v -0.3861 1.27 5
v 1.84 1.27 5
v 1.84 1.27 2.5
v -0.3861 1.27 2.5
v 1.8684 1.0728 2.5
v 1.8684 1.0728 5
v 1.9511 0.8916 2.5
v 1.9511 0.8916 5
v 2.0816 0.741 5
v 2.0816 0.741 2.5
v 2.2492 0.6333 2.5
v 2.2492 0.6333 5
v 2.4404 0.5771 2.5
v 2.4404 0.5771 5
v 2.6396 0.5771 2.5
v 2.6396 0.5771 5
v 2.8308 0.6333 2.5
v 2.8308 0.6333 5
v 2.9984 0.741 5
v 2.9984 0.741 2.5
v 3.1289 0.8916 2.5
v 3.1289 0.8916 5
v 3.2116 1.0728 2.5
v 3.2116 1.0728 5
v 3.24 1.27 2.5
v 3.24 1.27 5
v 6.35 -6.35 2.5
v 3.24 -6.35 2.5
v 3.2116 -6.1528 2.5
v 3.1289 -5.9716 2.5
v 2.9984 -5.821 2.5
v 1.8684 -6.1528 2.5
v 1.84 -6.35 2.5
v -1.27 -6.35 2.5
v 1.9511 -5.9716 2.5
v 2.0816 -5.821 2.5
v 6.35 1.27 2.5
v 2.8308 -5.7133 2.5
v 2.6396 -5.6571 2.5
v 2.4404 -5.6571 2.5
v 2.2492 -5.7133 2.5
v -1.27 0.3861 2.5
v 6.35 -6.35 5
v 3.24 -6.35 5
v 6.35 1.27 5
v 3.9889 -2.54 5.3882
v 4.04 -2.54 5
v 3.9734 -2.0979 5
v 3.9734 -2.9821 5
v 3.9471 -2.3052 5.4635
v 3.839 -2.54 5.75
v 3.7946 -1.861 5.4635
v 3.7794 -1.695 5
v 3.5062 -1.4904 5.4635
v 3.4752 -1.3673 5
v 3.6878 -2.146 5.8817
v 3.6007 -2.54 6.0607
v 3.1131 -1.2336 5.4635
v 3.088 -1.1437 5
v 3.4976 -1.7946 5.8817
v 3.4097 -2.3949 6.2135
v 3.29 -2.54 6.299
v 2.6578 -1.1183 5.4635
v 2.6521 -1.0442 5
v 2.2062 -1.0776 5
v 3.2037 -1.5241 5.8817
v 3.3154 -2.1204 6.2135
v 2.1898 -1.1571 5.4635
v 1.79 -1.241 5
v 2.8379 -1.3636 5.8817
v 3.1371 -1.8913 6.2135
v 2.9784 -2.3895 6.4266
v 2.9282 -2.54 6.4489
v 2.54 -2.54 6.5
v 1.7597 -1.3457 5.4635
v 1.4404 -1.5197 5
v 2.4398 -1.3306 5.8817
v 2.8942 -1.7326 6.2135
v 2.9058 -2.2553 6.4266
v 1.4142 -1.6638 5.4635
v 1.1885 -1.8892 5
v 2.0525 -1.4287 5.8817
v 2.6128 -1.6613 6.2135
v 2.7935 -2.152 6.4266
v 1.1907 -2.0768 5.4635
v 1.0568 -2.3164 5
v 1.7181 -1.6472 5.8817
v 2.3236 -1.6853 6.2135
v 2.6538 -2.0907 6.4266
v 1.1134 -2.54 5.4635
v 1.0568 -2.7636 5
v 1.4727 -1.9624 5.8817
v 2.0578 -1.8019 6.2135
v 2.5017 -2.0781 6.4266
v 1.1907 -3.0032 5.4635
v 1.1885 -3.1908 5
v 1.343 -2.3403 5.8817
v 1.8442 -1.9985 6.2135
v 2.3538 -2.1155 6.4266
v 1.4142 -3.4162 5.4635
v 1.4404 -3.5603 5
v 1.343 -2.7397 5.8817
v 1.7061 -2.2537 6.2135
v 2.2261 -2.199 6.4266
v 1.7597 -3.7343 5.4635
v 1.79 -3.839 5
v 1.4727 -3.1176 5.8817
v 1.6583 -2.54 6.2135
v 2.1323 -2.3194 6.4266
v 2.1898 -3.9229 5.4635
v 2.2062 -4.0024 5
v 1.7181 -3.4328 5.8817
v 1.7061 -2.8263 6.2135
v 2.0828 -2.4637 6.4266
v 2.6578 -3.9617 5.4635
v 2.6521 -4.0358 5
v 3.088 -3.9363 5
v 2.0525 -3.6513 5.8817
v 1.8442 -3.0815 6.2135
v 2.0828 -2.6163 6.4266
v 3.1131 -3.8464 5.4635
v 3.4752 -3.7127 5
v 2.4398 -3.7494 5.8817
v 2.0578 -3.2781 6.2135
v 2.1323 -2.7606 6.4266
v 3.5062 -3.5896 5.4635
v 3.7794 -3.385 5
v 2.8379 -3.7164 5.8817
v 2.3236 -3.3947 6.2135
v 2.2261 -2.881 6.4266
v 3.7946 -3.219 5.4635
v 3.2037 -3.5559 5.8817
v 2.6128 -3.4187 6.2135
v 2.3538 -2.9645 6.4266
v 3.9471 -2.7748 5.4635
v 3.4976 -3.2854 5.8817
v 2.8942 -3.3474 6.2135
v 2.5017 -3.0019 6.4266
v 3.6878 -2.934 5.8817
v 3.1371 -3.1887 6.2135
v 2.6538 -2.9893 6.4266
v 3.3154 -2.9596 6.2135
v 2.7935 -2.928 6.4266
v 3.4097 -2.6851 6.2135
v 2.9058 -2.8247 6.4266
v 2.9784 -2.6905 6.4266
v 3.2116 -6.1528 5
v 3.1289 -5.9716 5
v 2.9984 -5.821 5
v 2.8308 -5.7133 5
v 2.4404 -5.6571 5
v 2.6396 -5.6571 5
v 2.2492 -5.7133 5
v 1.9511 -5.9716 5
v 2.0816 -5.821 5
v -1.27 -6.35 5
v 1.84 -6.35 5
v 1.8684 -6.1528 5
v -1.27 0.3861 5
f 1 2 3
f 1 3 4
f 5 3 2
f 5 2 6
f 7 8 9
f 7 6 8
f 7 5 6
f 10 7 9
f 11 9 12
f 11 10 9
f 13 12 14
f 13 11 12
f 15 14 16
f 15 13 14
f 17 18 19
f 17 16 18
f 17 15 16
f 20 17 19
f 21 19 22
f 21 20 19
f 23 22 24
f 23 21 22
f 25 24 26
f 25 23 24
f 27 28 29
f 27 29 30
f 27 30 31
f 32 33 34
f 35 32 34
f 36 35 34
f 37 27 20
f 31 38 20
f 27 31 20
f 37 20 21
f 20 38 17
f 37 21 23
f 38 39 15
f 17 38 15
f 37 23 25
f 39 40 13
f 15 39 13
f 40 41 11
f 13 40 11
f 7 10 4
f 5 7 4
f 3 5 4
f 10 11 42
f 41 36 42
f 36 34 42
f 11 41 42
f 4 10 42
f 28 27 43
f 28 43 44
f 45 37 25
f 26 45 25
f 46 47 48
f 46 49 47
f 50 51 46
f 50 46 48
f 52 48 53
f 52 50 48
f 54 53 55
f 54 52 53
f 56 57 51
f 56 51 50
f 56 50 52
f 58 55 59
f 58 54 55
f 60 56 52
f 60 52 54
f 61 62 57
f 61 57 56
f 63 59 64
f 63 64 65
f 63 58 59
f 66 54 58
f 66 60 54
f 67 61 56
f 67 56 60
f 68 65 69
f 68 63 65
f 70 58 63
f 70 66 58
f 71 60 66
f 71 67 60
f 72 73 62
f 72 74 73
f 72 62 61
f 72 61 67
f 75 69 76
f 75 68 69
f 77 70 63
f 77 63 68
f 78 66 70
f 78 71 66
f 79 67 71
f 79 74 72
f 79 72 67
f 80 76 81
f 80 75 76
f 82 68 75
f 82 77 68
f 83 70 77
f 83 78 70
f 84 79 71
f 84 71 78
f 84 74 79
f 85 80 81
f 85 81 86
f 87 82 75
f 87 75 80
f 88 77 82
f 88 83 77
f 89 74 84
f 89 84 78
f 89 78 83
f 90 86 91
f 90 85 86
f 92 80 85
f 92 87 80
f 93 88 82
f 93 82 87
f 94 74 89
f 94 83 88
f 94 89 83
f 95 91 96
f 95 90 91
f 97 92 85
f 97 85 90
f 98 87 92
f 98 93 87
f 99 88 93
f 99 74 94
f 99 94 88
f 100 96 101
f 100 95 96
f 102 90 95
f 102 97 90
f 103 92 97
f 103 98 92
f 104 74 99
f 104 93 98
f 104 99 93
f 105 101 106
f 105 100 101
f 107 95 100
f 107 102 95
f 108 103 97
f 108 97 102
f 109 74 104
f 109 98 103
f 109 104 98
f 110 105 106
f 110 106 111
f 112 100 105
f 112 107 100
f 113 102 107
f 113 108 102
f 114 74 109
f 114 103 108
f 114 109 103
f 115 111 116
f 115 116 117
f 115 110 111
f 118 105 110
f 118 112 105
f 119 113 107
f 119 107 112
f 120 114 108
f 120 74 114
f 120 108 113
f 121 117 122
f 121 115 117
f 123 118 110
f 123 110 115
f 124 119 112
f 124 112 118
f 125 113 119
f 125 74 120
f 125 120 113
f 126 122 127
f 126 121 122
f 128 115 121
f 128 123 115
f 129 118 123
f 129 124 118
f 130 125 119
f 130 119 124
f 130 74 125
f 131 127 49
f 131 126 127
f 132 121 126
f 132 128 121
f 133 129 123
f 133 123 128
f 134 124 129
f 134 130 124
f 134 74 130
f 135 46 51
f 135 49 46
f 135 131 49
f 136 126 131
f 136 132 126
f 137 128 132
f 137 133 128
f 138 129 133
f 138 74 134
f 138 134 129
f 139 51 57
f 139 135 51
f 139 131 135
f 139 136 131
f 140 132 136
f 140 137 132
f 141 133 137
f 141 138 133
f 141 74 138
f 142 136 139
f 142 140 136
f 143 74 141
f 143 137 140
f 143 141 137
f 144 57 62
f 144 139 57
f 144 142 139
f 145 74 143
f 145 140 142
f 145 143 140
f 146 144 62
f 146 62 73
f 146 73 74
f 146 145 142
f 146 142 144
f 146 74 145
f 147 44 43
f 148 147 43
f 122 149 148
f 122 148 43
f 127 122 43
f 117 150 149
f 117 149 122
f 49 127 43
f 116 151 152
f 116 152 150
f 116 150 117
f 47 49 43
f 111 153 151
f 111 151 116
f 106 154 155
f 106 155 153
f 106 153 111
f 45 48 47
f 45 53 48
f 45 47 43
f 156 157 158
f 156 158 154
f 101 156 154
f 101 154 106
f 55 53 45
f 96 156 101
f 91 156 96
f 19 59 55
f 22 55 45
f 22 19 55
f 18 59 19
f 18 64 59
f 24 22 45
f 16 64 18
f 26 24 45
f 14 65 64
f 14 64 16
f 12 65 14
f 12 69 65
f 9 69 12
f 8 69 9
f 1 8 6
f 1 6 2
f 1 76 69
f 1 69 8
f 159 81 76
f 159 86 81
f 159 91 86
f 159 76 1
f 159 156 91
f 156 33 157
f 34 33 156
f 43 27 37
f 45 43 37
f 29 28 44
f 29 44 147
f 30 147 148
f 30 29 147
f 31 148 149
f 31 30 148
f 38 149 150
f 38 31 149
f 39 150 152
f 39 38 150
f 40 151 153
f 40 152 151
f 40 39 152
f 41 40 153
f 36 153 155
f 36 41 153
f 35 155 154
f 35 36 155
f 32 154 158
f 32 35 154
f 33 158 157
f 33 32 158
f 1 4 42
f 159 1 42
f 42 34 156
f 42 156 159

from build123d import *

# Parameters (mm, degrees)
BOX002_W               = 4
BOX002_H               = 4
BOX002_DEPTH           = 4
CYLINDER001_R          = 0.7
CYLINDER001_DEPTH      = 10
CYLINDER_R             = 0.7
CYLINDER_DEPTH         = 10
BOX001_W               = 1.25
BOX001_H               = 1.25
BOX001_DEPTH           = 2.5
BOX001_PLACEMENT_ANGLE = 45
BOX_W                  = 7.62
BOX_H                  = 7.62
BOX_DEPTH              = 2.5
CUT_PLACEMENT_ANGLE    = 90


with BuildPart() as lens_cut:
    # Box002 → Box002 (new body)
    with BuildSketch(Plane(origin=(-2, -2, -4), x_dir=(1, 0, 0), z_dir=(0, 0, 1))):
        with Locations((2, 2)):
            Rectangle(BOX002_W, BOX002_H)
    extrude(amount=BOX002_DEPTH)


with BuildPart() as led_lens001:
    # Sphere → Sphere (revolve)
    with BuildSketch(Plane.XZ):
        with BuildLine():
            ThreePointArc((0, -1.5), (1.5, 0), (0, 1.5))
            Line((0, 1.5), (0, -1.5))
        make_face()
    revolve(axis=Axis((0, 0, 0), (0, 0, 1)))

    # Cut003: cut Lens_cut
    add(lens_cut.part, mode=Mode.SUBTRACT)


with BuildPart() as led_lens001_1:
    # Cut003 placement: moved
    add(led_lens001.part.moved(Location((3.81, -3.81, 7.5))))


with BuildPart() as cut_led_right:
    # Cylinder001 → Cylinder001 (new body)
    with BuildSketch(Plane(origin=(3.81, -7.62, 0), x_dir=(1, 0, 0), z_dir=(0, 0, 1))):
        Circle(CYLINDER001_R)
    extrude(amount=CYLINDER001_DEPTH)


with BuildPart() as cut_led_left:
    # Cylinder → Cylinder (new body)
    with BuildSketch(Plane(origin=(3.81, 0, 0), x_dir=(1, 0, 0), z_dir=(0, 0, 1))):
        Circle(CYLINDER_R)
    extrude(amount=CYLINDER_DEPTH)


with BuildPart() as cut_cube:
    # Box001 → Box001 (new body)
    with BuildSketch(Plane.XY):
        with Locations((0.625, 0.625)):
            Rectangle(BOX001_W, BOX001_H)
    extrude(amount=BOX001_DEPTH)


with BuildPart() as cut_cube_1:
    # Box001 placement: moved
    add(cut_cube.part.moved(Location((7.62, 6.73612, 0))).rotate(Axis((7.62, 6.73612, 0), (0, 0, 1)), BOX001_PLACEMENT_ANGLE))


with BuildPart() as led_head002:
    # Box → Box (new body)
    with BuildSketch(Plane.XY):
        with Locations((3.81, 3.81)):
            Rectangle(BOX_W, BOX_H)
    extrude(amount=BOX_DEPTH)

    # Cut: cut cut_cube
    add(cut_cube_1.part, mode=Mode.SUBTRACT)


with BuildPart() as led_head002_1:
    # Cut placement: moved
    add(led_head002.part.moved(Location((7.62, -7.62, 5))).rotate(Axis((7.62, -7.62, 5), (0, 0, 1)), CUT_PLACEMENT_ANGLE))

    # Cut001: cut Cut_LED_left
    add(cut_led_left.part, mode=Mode.SUBTRACT)

    # Cut002: cut Cut_LED_right
    add(cut_led_right.part, mode=Mode.SUBTRACT)

    # Fusion008: union LED_lens001
    add(led_lens001_1.part)


with BuildPart() as led_head002_2:
    # Fusion008 placement: moved
    add(led_head002_1.part.moved(Location((-1.27, 1.27, -2.5))))


solid = led_head002_2.part
